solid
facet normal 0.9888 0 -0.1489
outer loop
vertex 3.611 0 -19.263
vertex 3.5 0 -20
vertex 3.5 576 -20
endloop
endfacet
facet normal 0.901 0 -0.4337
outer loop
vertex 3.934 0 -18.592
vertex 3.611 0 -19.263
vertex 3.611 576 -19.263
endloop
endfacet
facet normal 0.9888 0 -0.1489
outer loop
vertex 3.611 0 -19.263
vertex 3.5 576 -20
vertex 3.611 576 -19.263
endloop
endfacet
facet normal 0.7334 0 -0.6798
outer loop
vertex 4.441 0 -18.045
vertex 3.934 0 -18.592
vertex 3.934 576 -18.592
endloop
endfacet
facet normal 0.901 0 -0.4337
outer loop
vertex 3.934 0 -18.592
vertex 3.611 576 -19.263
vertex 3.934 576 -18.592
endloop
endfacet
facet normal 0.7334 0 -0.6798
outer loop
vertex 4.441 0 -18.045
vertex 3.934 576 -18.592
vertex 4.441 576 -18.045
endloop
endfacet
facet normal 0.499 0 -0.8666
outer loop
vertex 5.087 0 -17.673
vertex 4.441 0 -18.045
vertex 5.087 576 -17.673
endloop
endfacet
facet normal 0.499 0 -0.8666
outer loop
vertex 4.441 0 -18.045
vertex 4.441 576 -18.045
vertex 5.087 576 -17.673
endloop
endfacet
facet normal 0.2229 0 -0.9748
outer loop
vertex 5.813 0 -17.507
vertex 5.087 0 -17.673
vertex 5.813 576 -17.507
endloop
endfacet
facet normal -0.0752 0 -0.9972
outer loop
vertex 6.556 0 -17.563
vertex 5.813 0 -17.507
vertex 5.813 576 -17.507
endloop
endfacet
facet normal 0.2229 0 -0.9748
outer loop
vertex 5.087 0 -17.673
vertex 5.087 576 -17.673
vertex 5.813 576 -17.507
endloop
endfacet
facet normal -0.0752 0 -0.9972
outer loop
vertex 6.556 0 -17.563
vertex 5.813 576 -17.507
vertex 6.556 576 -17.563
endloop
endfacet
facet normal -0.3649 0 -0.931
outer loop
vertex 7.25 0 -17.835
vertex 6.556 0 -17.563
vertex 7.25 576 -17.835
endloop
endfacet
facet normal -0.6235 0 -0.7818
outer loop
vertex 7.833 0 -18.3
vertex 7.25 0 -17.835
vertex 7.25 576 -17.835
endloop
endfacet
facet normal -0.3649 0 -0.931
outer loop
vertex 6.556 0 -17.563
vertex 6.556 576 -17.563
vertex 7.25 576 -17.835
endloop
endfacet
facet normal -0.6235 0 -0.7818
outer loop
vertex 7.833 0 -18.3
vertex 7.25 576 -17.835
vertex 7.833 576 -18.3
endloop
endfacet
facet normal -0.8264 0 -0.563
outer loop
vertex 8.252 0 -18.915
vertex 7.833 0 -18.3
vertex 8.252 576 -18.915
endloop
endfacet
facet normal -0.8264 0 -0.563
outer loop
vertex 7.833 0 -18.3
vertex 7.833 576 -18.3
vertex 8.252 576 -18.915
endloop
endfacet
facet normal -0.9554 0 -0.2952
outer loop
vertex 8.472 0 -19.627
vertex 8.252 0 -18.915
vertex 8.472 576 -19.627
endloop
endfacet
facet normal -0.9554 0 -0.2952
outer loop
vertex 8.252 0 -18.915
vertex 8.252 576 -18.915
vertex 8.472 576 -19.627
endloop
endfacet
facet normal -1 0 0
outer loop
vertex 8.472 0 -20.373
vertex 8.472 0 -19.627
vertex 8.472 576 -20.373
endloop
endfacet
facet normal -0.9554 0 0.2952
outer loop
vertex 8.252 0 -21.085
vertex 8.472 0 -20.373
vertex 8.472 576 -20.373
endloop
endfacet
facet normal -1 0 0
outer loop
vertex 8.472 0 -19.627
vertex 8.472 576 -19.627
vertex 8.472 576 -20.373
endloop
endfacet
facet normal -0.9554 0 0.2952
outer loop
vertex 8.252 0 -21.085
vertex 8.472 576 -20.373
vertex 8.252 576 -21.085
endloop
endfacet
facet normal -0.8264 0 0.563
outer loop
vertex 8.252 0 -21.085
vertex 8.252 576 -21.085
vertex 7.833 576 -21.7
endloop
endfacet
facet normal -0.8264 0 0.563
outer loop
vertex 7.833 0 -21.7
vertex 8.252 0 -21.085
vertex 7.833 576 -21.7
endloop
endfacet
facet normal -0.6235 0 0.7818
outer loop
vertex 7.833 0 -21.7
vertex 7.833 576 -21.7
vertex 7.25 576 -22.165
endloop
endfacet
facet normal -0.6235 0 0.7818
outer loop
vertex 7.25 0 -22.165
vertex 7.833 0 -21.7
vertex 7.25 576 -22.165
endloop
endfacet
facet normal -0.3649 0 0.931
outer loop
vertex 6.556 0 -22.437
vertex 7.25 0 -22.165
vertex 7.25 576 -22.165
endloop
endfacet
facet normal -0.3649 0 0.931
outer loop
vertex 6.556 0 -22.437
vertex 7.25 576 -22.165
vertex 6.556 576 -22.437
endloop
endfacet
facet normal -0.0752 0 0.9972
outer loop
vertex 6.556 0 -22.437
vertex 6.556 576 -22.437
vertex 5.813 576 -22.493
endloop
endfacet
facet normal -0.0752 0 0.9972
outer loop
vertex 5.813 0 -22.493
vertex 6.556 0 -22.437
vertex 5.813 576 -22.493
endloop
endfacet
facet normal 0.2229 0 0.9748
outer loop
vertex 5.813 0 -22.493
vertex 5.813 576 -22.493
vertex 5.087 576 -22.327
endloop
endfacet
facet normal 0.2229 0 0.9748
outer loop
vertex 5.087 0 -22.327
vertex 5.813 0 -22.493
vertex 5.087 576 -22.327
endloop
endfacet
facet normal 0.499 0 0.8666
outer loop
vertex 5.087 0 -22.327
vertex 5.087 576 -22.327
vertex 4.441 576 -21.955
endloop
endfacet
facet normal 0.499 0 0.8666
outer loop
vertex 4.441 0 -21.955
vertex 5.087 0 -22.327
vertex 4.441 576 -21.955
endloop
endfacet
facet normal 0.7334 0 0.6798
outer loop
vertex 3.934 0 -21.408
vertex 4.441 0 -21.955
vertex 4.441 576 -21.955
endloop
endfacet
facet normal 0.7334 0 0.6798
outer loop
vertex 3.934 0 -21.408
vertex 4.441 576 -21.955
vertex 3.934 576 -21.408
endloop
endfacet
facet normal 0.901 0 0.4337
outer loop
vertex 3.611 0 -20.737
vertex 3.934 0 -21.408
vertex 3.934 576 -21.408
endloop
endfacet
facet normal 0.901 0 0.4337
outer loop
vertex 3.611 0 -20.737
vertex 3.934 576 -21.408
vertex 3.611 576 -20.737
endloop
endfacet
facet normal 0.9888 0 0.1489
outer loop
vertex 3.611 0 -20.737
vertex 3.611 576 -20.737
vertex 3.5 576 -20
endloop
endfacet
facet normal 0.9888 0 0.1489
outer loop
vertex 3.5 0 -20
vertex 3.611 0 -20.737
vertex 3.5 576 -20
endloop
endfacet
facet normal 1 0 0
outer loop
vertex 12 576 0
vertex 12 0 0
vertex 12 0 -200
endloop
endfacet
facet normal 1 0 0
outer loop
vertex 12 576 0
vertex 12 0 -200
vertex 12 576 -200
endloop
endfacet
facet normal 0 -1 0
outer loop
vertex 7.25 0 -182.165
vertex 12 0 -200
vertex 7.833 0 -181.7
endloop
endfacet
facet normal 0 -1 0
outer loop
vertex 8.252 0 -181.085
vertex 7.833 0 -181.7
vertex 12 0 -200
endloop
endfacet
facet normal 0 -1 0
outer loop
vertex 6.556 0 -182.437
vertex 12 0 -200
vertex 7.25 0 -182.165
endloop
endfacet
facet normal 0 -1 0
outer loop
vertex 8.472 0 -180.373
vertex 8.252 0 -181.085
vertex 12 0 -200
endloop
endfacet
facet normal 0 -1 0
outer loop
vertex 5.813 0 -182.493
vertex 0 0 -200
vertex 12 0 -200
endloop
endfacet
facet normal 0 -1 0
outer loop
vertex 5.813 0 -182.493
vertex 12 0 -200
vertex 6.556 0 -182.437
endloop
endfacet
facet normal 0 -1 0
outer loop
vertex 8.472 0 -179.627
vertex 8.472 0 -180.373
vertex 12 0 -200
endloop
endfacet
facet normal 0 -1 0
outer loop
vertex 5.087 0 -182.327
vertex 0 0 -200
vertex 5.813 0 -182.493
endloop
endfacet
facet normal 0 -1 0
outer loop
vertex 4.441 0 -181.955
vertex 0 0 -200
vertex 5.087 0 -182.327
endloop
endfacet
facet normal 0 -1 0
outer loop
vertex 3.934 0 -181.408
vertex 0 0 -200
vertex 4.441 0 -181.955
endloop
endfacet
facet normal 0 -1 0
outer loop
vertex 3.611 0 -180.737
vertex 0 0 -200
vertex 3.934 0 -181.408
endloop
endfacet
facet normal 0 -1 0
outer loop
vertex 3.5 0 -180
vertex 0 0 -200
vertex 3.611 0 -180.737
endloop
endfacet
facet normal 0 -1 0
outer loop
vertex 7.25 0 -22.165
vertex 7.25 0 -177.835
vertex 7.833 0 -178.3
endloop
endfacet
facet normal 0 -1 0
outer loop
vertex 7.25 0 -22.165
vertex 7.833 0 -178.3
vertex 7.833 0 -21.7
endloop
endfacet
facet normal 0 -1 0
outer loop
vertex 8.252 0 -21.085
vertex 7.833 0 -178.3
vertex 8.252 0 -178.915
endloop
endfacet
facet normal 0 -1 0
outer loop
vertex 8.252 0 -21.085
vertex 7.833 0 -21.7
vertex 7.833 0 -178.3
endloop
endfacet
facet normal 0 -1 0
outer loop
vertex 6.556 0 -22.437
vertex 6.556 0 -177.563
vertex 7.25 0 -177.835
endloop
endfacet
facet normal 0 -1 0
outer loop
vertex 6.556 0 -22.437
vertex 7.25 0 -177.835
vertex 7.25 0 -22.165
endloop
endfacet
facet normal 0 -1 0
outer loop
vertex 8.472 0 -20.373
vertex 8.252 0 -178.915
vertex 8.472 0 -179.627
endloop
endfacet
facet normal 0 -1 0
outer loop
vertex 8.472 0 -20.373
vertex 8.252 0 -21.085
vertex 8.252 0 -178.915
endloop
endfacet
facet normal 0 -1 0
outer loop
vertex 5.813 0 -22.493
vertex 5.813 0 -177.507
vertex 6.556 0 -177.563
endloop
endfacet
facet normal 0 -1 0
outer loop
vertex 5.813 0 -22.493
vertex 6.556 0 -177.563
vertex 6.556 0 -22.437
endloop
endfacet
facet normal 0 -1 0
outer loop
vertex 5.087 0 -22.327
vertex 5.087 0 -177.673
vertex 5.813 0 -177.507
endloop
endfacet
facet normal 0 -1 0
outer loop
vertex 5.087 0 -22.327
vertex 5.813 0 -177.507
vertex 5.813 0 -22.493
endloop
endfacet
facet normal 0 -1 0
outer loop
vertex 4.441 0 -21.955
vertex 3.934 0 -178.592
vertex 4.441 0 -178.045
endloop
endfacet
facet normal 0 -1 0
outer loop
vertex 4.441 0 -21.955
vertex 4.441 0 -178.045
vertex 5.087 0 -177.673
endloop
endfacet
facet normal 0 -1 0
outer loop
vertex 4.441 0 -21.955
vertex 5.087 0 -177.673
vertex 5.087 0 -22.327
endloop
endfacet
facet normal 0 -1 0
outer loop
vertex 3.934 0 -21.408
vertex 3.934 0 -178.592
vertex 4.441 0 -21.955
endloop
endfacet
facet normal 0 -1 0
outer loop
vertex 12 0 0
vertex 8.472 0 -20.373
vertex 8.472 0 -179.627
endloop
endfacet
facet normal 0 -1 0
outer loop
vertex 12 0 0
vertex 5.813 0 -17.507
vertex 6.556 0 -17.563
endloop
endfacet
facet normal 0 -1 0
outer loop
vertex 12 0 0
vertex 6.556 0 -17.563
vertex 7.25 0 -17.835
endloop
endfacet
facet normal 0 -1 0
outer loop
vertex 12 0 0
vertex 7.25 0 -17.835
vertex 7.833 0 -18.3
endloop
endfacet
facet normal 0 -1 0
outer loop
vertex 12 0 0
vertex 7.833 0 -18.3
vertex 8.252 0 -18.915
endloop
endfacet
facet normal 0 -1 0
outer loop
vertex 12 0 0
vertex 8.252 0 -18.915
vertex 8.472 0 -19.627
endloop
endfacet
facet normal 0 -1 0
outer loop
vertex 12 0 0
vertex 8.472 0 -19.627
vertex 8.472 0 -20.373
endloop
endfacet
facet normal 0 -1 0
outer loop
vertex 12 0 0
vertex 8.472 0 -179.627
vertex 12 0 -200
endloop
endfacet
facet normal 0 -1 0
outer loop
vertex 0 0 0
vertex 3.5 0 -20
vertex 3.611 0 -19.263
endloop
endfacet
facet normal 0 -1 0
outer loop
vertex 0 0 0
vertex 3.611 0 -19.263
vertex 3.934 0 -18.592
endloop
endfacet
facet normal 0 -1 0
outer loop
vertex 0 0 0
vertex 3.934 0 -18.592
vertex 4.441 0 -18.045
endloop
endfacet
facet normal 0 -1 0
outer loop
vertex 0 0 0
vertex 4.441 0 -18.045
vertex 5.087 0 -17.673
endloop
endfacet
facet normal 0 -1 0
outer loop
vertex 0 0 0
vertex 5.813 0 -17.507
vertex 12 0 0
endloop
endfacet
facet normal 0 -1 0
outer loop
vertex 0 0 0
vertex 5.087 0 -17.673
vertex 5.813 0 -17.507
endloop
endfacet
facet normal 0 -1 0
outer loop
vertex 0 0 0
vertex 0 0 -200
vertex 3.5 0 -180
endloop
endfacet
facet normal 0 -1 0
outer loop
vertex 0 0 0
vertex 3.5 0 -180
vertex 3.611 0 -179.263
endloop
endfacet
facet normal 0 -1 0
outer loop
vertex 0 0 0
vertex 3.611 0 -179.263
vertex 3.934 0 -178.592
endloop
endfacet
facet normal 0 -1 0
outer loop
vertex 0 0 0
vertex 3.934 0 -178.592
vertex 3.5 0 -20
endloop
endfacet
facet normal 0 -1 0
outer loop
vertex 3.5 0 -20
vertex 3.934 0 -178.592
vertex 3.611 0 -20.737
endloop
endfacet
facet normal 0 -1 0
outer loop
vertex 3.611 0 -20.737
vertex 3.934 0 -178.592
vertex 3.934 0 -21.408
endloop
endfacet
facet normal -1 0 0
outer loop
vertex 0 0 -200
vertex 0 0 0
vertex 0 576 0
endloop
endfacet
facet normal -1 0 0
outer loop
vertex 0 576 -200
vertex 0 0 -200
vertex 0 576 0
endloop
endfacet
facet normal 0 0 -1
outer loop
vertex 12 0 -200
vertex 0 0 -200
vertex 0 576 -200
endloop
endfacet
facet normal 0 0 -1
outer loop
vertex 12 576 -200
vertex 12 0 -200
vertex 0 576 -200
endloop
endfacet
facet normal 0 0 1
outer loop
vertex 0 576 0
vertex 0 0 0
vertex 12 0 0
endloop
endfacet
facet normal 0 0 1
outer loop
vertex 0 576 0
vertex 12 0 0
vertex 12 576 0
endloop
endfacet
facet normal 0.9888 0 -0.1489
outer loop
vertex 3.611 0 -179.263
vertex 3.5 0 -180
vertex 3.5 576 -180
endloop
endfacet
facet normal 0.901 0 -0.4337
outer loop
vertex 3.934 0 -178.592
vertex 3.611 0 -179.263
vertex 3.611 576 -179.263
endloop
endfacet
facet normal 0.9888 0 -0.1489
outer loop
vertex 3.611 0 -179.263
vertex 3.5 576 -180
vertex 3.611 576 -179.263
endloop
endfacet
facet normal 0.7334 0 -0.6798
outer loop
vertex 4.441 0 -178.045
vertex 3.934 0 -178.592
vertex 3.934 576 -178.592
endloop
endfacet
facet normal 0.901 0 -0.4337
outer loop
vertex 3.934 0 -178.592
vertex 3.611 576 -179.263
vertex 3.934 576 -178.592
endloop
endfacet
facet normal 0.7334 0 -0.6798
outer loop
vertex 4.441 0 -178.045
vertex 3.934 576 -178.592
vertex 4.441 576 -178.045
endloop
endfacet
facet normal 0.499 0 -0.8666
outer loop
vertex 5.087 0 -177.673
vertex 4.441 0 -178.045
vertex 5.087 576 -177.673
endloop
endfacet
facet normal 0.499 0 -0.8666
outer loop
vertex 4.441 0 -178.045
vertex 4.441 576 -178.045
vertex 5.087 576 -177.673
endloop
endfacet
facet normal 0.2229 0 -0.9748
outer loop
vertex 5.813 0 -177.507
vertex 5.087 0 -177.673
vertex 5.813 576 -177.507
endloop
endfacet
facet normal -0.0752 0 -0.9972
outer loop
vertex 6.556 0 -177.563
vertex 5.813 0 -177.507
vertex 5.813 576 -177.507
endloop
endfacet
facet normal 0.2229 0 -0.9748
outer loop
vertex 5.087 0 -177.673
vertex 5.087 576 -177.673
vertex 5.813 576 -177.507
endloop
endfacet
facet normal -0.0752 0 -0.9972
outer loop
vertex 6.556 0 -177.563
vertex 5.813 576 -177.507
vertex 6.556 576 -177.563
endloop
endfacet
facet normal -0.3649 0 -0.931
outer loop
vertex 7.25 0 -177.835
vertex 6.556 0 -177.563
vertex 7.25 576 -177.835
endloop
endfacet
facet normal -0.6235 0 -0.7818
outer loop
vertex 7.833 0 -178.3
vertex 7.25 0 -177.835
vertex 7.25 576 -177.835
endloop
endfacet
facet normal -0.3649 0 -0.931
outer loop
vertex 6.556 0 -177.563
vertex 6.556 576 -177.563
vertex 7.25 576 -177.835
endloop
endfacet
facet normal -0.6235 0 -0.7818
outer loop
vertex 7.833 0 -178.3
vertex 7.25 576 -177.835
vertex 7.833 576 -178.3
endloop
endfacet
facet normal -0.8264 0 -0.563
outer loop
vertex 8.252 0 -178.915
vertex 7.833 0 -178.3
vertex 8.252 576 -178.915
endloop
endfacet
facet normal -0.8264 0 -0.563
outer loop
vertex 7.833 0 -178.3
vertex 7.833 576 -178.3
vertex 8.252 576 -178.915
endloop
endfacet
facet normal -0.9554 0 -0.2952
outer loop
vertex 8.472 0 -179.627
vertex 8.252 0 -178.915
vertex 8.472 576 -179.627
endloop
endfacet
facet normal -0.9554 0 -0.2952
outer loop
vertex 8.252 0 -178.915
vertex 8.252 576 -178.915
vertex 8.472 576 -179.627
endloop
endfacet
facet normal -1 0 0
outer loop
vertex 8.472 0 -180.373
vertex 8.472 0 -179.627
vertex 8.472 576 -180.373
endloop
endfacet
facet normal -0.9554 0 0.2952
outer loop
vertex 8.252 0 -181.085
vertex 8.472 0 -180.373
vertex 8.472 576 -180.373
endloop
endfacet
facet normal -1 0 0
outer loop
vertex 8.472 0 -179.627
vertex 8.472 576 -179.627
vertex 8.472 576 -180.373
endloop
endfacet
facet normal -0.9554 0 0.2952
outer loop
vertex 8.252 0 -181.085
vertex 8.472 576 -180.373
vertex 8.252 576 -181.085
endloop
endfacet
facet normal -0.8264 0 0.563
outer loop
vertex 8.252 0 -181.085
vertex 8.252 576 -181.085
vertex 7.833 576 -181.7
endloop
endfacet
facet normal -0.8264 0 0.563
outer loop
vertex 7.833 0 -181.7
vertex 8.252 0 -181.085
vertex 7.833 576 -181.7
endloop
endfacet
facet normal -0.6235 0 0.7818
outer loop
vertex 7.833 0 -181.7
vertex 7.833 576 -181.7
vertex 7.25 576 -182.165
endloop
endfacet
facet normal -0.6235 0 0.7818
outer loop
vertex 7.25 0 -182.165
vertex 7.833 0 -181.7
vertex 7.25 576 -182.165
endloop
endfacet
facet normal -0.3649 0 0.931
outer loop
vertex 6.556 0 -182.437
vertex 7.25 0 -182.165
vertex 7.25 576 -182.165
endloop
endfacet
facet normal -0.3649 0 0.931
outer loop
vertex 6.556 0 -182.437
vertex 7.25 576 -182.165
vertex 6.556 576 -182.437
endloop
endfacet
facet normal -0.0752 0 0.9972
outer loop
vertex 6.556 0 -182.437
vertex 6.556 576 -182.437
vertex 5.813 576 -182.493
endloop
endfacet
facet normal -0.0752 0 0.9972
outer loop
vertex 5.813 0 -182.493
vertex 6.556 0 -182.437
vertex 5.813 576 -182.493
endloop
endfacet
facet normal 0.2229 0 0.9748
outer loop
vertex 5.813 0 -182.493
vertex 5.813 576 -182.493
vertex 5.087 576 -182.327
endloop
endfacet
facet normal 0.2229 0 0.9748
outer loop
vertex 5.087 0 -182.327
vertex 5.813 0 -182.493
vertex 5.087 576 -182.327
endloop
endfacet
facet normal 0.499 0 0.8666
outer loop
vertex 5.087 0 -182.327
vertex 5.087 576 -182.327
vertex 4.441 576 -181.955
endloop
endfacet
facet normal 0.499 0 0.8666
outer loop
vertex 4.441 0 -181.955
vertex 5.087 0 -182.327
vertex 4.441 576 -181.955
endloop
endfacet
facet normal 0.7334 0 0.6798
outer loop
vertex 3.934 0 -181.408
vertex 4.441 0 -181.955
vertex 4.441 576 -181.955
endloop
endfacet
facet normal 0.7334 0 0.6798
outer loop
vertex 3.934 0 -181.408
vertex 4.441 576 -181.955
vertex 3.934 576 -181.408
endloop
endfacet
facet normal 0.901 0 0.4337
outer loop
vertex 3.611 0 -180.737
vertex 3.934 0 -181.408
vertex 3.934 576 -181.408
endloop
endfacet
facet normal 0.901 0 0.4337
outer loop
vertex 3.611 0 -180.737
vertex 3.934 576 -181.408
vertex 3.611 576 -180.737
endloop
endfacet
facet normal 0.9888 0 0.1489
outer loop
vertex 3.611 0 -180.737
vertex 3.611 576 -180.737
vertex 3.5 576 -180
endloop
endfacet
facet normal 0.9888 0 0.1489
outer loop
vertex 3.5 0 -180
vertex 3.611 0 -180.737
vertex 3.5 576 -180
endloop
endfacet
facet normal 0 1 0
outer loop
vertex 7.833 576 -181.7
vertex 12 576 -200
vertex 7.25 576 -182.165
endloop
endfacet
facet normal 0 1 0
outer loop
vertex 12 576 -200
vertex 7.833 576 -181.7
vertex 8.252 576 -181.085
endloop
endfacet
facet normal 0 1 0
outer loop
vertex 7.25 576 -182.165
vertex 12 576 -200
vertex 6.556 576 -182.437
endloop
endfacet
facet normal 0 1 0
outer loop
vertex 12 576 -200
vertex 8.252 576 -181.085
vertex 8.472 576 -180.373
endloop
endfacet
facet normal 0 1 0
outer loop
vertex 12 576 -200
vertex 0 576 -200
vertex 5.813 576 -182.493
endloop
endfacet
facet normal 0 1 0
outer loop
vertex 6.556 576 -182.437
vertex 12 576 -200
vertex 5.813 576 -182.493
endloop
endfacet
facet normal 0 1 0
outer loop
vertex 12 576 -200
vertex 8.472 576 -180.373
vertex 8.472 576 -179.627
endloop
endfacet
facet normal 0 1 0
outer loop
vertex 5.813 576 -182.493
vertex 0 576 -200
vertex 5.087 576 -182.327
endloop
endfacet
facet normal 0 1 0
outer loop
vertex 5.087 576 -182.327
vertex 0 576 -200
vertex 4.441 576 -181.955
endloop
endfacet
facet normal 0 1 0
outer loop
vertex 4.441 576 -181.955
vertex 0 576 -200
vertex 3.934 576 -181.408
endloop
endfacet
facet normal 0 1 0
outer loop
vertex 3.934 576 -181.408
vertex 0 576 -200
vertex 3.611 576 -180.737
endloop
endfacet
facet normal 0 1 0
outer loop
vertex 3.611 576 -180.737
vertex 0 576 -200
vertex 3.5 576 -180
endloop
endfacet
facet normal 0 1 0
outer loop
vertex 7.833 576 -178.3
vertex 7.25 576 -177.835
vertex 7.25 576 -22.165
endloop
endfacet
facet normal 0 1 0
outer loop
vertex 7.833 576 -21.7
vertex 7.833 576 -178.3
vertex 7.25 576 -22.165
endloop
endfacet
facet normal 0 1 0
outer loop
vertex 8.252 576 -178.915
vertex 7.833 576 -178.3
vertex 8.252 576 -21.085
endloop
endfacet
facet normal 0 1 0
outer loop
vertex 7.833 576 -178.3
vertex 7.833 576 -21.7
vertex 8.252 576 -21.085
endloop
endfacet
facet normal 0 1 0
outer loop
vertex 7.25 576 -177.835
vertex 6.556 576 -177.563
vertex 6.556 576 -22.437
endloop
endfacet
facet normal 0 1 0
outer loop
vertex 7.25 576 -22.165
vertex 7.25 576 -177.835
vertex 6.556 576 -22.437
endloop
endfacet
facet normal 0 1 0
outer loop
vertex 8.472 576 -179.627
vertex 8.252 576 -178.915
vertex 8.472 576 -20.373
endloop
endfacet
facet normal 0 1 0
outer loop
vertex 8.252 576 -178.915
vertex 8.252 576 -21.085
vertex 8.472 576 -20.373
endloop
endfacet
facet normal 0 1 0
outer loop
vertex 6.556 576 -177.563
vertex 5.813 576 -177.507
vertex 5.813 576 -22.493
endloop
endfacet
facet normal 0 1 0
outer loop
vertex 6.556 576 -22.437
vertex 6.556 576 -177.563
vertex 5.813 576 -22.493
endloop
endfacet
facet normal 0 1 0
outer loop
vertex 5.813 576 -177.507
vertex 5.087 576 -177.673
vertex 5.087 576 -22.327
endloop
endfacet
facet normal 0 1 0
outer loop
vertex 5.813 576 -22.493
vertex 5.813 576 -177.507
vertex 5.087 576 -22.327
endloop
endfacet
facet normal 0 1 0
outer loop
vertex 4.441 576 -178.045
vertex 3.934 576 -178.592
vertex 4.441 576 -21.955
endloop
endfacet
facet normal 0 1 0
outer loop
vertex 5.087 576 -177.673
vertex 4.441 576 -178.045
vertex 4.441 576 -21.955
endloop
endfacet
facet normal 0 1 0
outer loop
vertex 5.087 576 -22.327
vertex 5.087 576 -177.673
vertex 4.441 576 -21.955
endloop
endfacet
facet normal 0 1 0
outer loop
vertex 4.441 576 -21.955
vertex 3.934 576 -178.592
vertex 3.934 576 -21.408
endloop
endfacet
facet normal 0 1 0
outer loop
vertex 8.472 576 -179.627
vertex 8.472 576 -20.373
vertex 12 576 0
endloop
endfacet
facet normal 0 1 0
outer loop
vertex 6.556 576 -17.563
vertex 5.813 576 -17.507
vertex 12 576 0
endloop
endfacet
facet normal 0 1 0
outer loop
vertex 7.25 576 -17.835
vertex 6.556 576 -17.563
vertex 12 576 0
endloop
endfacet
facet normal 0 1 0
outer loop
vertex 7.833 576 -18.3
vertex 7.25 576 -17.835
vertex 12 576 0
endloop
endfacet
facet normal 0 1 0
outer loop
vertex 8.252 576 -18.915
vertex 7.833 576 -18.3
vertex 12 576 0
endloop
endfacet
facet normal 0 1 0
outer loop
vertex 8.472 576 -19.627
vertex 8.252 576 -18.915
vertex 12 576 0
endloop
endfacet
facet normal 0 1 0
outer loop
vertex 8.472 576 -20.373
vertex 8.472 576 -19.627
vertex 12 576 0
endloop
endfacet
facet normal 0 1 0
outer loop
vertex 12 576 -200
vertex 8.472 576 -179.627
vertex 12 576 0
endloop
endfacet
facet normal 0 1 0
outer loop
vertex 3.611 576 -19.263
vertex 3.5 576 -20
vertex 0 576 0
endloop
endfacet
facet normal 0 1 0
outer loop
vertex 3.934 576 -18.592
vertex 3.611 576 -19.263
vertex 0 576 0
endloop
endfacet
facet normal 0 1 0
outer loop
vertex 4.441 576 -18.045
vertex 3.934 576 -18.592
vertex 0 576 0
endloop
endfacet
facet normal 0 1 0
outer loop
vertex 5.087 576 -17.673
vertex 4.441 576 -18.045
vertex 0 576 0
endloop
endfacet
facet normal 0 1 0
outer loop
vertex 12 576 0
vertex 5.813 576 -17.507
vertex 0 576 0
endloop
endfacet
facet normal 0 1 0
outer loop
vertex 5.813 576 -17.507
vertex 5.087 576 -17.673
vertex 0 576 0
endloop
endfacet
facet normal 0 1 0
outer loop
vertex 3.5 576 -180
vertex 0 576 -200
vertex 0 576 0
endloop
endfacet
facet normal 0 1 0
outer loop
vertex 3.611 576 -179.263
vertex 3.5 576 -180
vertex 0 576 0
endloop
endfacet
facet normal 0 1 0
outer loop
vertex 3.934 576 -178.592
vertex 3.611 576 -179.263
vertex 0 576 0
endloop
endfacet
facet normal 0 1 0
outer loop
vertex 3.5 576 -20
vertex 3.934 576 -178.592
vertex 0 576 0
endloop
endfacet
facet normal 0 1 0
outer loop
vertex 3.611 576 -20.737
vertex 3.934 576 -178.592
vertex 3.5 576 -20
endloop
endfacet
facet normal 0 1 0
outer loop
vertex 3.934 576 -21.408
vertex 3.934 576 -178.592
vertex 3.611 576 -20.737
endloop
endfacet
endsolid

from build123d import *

# Parameters (mm, degrees)
F0_W     = 576
F0_H     = 200
F1_DEPTH = 12
F3_D     = 5


with BuildPart() as f1:
    # F0 (on Right) → F1 (new body)
    with BuildSketch(Plane.YZ):
        with Locations((288, -100)):
            Rectangle(F0_W, F0_H)
    extrude(amount=F1_DEPTH)

    # F3 (through all)
    with Locations(Plane.XZ):
        with Locations((6, -20), (6, -180)):
            Hole(F3_D / 2)


solid = f1.part
